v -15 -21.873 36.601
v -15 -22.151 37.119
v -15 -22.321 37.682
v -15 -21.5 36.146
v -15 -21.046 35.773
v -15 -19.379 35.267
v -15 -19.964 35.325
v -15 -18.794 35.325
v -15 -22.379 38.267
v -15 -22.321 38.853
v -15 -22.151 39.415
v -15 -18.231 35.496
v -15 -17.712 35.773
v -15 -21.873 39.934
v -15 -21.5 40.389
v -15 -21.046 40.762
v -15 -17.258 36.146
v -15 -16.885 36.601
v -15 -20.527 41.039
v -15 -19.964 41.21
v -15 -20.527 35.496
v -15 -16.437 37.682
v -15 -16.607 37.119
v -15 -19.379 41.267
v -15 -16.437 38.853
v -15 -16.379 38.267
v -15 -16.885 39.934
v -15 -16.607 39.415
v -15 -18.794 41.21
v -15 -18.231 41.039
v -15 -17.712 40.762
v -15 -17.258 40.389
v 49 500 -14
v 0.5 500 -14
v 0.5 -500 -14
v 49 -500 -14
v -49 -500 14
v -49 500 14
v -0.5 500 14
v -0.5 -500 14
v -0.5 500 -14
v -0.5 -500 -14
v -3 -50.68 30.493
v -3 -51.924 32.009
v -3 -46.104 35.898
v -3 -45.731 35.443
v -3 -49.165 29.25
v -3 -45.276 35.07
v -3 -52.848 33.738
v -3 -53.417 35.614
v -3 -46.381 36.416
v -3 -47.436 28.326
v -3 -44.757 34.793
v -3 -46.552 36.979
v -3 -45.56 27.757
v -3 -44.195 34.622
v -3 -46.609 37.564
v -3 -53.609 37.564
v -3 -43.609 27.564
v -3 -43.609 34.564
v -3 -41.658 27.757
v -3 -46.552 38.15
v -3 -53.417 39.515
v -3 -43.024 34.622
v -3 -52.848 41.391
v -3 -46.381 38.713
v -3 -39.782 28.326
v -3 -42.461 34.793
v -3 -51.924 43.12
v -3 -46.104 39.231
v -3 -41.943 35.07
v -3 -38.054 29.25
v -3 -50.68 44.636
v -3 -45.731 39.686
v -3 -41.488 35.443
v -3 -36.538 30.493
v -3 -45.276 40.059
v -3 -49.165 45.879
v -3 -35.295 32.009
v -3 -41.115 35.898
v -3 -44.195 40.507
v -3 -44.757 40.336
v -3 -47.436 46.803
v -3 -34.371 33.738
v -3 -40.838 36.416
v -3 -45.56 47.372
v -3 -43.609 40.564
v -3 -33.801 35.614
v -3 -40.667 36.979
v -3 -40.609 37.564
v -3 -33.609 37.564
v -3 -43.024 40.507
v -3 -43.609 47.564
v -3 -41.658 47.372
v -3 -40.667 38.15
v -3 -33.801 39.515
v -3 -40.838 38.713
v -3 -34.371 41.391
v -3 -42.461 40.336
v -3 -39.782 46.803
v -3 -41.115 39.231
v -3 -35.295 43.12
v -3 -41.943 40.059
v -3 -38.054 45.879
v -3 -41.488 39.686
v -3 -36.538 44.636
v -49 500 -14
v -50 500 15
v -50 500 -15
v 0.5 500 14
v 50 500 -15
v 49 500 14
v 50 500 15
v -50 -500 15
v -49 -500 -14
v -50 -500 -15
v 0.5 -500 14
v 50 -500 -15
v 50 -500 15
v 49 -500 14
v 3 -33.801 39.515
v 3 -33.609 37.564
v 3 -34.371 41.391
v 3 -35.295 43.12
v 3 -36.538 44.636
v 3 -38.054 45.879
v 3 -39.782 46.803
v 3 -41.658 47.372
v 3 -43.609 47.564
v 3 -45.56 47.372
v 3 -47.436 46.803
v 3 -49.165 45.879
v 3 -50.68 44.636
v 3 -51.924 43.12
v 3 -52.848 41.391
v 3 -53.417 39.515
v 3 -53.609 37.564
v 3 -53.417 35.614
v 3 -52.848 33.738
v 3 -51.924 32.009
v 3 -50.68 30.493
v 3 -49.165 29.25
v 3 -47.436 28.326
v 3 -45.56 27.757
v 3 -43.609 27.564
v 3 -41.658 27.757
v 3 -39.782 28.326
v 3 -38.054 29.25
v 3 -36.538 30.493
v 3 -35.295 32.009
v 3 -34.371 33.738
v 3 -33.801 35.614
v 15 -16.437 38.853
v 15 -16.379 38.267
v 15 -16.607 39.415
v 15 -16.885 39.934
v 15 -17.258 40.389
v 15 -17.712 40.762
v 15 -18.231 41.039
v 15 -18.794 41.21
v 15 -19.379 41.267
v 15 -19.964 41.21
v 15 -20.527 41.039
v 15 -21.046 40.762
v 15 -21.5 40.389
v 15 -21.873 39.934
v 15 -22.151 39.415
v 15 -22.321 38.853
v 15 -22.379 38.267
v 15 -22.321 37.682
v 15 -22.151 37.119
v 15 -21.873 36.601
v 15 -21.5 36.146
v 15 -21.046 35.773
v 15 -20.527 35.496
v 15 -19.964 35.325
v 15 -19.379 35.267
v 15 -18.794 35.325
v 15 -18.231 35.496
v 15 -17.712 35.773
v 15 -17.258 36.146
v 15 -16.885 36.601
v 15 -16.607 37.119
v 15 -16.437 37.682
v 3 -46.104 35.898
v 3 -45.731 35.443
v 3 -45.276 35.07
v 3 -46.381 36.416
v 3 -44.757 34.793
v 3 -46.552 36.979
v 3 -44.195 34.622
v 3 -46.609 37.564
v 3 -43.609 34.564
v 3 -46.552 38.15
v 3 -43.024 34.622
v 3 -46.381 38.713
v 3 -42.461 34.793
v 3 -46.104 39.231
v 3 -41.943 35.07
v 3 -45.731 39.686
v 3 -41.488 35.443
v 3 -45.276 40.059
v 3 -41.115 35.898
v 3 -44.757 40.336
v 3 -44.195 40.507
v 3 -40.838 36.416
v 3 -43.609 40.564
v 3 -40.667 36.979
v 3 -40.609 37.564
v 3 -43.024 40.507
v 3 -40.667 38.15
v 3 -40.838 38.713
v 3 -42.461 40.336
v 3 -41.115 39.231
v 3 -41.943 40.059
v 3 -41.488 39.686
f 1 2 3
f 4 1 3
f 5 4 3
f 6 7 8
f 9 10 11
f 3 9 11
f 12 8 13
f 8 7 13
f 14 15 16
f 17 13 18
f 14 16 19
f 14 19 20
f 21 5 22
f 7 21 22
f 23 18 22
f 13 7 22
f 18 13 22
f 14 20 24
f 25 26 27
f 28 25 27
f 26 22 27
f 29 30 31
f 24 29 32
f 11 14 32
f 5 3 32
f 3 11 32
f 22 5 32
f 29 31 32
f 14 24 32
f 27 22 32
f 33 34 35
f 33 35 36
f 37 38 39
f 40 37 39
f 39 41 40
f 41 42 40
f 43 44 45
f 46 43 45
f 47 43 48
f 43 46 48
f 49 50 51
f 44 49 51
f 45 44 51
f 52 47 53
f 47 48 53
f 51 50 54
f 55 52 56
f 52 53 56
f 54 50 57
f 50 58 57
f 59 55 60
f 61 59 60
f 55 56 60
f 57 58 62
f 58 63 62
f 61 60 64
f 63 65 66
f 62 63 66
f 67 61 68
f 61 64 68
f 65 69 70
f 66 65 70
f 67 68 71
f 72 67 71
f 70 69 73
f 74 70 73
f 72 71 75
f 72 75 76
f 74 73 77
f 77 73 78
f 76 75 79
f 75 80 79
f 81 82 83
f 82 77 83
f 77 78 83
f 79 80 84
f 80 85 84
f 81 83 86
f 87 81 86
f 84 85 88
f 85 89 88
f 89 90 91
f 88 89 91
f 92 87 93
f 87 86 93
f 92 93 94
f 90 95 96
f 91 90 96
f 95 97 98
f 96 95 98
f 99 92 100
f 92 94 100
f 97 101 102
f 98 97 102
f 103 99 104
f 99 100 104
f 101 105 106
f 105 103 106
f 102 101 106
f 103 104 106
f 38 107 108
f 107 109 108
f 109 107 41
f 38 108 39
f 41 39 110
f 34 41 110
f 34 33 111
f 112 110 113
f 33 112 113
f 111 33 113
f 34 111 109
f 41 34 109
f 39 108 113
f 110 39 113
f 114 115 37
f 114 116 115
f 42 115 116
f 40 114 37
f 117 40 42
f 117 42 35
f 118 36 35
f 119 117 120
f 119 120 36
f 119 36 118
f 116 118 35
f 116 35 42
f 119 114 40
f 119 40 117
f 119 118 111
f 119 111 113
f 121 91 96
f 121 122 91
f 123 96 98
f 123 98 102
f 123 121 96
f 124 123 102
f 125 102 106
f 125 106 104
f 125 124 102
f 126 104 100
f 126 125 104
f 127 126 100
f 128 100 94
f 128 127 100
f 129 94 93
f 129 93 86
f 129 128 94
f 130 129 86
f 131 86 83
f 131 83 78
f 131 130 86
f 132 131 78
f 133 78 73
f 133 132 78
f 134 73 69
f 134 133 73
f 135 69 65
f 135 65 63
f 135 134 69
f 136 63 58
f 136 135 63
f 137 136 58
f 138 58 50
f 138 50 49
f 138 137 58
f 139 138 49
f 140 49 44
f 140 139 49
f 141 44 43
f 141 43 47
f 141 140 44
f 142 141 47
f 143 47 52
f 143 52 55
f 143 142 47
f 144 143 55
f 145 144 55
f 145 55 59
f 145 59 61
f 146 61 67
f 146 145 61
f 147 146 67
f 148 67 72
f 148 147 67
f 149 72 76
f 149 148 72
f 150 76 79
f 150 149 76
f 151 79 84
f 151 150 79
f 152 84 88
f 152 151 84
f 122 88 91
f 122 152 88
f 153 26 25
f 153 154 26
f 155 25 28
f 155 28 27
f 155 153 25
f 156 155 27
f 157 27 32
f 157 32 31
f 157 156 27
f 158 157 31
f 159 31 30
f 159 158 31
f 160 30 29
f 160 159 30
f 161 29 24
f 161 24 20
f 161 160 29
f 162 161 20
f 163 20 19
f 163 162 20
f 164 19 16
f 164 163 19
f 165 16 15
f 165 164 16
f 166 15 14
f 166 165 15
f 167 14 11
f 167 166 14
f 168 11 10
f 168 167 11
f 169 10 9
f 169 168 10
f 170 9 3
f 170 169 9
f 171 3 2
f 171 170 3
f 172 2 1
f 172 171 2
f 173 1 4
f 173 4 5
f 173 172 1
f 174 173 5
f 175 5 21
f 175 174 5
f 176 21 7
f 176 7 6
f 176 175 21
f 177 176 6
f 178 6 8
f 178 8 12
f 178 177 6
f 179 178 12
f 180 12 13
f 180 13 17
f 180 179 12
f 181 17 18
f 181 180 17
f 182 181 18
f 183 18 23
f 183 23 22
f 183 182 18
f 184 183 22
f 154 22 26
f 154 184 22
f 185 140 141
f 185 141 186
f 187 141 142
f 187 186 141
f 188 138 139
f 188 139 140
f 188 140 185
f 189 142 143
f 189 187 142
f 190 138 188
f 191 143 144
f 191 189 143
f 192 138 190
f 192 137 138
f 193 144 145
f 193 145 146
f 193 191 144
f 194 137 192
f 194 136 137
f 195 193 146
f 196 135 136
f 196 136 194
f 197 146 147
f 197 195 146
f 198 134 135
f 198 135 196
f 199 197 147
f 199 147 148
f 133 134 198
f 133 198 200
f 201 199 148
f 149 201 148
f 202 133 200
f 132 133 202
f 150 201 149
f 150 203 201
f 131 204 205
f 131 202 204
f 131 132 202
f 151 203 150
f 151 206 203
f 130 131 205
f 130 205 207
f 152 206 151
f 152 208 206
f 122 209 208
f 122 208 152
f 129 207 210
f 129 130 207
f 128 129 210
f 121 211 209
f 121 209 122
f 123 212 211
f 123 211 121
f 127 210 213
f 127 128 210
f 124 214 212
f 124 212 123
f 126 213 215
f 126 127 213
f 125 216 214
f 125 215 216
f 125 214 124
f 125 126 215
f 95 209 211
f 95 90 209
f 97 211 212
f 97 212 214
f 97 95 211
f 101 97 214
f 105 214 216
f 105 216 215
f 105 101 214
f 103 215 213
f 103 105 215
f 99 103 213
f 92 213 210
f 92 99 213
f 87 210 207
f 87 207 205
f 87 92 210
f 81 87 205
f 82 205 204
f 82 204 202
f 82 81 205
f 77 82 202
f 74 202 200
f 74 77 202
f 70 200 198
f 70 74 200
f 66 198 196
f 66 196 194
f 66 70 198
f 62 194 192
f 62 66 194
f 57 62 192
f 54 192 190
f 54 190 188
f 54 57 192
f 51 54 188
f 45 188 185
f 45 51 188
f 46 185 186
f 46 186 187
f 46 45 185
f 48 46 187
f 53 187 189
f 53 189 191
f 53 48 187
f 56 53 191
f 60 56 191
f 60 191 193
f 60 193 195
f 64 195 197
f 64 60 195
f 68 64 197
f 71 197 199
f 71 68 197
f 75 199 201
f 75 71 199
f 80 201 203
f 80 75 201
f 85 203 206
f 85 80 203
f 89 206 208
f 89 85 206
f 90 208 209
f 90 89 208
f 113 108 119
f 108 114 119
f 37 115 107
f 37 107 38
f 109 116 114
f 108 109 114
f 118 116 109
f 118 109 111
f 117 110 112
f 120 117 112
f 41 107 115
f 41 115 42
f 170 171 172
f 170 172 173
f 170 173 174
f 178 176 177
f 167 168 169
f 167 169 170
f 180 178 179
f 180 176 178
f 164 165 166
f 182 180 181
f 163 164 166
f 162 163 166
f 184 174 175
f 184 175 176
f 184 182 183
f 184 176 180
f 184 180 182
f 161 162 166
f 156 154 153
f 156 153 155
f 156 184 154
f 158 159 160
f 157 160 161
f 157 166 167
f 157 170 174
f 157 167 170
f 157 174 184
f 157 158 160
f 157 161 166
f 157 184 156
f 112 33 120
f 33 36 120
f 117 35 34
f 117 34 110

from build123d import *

# Parameters (mm, degrees)
F5_W      = 100
F5_H      = 30
F5_W_2    = 48.5
F5_H_2    = 28
F6_DEPTH  = 500
F7_R      = 10
F7_R_2    = 3
F8_DEPTH  = 3
F9_R      = 3
F10_DEPTH = 15


with BuildPart() as f6:
    # F5 (on Front) → F6 (new body, symmetric)
    with BuildSketch(Plane.XZ):
        Rectangle(F5_W, F5_H)
        with Locations((-24.75, 0)):
            Rectangle(F5_W_2, F5_H_2, mode=Mode.SUBTRACT)
        with Locations((24.75, 0)):
            Rectangle(F5_W_2, F5_H_2, mode=Mode.SUBTRACT)
    extrude(amount=F6_DEPTH, both=True)


with BuildPart() as f8:
    # F7 (on Right) → F8 (new body, symmetric)
    with BuildSketch(Plane.YZ):
        with Locations((-43.6093322933, 37.5644527376)):
            Circle(F7_R)
        with Locations((-43.6093322933, 37.5644527376)):
            Circle(F7_R_2, mode=Mode.SUBTRACT)
    extrude(amount=F8_DEPTH, both=True)


with BuildPart() as f10:
    # F9 (on Right) → F10 (new body, symmetric)
    with BuildSketch(Plane.YZ):
        with Locations((-19.3789340556, 38.2673740387)):
            Circle(F9_R)
    extrude(amount=F10_DEPTH, both=True)


solid = Compound([f6.part, f8.part, f10.part])
